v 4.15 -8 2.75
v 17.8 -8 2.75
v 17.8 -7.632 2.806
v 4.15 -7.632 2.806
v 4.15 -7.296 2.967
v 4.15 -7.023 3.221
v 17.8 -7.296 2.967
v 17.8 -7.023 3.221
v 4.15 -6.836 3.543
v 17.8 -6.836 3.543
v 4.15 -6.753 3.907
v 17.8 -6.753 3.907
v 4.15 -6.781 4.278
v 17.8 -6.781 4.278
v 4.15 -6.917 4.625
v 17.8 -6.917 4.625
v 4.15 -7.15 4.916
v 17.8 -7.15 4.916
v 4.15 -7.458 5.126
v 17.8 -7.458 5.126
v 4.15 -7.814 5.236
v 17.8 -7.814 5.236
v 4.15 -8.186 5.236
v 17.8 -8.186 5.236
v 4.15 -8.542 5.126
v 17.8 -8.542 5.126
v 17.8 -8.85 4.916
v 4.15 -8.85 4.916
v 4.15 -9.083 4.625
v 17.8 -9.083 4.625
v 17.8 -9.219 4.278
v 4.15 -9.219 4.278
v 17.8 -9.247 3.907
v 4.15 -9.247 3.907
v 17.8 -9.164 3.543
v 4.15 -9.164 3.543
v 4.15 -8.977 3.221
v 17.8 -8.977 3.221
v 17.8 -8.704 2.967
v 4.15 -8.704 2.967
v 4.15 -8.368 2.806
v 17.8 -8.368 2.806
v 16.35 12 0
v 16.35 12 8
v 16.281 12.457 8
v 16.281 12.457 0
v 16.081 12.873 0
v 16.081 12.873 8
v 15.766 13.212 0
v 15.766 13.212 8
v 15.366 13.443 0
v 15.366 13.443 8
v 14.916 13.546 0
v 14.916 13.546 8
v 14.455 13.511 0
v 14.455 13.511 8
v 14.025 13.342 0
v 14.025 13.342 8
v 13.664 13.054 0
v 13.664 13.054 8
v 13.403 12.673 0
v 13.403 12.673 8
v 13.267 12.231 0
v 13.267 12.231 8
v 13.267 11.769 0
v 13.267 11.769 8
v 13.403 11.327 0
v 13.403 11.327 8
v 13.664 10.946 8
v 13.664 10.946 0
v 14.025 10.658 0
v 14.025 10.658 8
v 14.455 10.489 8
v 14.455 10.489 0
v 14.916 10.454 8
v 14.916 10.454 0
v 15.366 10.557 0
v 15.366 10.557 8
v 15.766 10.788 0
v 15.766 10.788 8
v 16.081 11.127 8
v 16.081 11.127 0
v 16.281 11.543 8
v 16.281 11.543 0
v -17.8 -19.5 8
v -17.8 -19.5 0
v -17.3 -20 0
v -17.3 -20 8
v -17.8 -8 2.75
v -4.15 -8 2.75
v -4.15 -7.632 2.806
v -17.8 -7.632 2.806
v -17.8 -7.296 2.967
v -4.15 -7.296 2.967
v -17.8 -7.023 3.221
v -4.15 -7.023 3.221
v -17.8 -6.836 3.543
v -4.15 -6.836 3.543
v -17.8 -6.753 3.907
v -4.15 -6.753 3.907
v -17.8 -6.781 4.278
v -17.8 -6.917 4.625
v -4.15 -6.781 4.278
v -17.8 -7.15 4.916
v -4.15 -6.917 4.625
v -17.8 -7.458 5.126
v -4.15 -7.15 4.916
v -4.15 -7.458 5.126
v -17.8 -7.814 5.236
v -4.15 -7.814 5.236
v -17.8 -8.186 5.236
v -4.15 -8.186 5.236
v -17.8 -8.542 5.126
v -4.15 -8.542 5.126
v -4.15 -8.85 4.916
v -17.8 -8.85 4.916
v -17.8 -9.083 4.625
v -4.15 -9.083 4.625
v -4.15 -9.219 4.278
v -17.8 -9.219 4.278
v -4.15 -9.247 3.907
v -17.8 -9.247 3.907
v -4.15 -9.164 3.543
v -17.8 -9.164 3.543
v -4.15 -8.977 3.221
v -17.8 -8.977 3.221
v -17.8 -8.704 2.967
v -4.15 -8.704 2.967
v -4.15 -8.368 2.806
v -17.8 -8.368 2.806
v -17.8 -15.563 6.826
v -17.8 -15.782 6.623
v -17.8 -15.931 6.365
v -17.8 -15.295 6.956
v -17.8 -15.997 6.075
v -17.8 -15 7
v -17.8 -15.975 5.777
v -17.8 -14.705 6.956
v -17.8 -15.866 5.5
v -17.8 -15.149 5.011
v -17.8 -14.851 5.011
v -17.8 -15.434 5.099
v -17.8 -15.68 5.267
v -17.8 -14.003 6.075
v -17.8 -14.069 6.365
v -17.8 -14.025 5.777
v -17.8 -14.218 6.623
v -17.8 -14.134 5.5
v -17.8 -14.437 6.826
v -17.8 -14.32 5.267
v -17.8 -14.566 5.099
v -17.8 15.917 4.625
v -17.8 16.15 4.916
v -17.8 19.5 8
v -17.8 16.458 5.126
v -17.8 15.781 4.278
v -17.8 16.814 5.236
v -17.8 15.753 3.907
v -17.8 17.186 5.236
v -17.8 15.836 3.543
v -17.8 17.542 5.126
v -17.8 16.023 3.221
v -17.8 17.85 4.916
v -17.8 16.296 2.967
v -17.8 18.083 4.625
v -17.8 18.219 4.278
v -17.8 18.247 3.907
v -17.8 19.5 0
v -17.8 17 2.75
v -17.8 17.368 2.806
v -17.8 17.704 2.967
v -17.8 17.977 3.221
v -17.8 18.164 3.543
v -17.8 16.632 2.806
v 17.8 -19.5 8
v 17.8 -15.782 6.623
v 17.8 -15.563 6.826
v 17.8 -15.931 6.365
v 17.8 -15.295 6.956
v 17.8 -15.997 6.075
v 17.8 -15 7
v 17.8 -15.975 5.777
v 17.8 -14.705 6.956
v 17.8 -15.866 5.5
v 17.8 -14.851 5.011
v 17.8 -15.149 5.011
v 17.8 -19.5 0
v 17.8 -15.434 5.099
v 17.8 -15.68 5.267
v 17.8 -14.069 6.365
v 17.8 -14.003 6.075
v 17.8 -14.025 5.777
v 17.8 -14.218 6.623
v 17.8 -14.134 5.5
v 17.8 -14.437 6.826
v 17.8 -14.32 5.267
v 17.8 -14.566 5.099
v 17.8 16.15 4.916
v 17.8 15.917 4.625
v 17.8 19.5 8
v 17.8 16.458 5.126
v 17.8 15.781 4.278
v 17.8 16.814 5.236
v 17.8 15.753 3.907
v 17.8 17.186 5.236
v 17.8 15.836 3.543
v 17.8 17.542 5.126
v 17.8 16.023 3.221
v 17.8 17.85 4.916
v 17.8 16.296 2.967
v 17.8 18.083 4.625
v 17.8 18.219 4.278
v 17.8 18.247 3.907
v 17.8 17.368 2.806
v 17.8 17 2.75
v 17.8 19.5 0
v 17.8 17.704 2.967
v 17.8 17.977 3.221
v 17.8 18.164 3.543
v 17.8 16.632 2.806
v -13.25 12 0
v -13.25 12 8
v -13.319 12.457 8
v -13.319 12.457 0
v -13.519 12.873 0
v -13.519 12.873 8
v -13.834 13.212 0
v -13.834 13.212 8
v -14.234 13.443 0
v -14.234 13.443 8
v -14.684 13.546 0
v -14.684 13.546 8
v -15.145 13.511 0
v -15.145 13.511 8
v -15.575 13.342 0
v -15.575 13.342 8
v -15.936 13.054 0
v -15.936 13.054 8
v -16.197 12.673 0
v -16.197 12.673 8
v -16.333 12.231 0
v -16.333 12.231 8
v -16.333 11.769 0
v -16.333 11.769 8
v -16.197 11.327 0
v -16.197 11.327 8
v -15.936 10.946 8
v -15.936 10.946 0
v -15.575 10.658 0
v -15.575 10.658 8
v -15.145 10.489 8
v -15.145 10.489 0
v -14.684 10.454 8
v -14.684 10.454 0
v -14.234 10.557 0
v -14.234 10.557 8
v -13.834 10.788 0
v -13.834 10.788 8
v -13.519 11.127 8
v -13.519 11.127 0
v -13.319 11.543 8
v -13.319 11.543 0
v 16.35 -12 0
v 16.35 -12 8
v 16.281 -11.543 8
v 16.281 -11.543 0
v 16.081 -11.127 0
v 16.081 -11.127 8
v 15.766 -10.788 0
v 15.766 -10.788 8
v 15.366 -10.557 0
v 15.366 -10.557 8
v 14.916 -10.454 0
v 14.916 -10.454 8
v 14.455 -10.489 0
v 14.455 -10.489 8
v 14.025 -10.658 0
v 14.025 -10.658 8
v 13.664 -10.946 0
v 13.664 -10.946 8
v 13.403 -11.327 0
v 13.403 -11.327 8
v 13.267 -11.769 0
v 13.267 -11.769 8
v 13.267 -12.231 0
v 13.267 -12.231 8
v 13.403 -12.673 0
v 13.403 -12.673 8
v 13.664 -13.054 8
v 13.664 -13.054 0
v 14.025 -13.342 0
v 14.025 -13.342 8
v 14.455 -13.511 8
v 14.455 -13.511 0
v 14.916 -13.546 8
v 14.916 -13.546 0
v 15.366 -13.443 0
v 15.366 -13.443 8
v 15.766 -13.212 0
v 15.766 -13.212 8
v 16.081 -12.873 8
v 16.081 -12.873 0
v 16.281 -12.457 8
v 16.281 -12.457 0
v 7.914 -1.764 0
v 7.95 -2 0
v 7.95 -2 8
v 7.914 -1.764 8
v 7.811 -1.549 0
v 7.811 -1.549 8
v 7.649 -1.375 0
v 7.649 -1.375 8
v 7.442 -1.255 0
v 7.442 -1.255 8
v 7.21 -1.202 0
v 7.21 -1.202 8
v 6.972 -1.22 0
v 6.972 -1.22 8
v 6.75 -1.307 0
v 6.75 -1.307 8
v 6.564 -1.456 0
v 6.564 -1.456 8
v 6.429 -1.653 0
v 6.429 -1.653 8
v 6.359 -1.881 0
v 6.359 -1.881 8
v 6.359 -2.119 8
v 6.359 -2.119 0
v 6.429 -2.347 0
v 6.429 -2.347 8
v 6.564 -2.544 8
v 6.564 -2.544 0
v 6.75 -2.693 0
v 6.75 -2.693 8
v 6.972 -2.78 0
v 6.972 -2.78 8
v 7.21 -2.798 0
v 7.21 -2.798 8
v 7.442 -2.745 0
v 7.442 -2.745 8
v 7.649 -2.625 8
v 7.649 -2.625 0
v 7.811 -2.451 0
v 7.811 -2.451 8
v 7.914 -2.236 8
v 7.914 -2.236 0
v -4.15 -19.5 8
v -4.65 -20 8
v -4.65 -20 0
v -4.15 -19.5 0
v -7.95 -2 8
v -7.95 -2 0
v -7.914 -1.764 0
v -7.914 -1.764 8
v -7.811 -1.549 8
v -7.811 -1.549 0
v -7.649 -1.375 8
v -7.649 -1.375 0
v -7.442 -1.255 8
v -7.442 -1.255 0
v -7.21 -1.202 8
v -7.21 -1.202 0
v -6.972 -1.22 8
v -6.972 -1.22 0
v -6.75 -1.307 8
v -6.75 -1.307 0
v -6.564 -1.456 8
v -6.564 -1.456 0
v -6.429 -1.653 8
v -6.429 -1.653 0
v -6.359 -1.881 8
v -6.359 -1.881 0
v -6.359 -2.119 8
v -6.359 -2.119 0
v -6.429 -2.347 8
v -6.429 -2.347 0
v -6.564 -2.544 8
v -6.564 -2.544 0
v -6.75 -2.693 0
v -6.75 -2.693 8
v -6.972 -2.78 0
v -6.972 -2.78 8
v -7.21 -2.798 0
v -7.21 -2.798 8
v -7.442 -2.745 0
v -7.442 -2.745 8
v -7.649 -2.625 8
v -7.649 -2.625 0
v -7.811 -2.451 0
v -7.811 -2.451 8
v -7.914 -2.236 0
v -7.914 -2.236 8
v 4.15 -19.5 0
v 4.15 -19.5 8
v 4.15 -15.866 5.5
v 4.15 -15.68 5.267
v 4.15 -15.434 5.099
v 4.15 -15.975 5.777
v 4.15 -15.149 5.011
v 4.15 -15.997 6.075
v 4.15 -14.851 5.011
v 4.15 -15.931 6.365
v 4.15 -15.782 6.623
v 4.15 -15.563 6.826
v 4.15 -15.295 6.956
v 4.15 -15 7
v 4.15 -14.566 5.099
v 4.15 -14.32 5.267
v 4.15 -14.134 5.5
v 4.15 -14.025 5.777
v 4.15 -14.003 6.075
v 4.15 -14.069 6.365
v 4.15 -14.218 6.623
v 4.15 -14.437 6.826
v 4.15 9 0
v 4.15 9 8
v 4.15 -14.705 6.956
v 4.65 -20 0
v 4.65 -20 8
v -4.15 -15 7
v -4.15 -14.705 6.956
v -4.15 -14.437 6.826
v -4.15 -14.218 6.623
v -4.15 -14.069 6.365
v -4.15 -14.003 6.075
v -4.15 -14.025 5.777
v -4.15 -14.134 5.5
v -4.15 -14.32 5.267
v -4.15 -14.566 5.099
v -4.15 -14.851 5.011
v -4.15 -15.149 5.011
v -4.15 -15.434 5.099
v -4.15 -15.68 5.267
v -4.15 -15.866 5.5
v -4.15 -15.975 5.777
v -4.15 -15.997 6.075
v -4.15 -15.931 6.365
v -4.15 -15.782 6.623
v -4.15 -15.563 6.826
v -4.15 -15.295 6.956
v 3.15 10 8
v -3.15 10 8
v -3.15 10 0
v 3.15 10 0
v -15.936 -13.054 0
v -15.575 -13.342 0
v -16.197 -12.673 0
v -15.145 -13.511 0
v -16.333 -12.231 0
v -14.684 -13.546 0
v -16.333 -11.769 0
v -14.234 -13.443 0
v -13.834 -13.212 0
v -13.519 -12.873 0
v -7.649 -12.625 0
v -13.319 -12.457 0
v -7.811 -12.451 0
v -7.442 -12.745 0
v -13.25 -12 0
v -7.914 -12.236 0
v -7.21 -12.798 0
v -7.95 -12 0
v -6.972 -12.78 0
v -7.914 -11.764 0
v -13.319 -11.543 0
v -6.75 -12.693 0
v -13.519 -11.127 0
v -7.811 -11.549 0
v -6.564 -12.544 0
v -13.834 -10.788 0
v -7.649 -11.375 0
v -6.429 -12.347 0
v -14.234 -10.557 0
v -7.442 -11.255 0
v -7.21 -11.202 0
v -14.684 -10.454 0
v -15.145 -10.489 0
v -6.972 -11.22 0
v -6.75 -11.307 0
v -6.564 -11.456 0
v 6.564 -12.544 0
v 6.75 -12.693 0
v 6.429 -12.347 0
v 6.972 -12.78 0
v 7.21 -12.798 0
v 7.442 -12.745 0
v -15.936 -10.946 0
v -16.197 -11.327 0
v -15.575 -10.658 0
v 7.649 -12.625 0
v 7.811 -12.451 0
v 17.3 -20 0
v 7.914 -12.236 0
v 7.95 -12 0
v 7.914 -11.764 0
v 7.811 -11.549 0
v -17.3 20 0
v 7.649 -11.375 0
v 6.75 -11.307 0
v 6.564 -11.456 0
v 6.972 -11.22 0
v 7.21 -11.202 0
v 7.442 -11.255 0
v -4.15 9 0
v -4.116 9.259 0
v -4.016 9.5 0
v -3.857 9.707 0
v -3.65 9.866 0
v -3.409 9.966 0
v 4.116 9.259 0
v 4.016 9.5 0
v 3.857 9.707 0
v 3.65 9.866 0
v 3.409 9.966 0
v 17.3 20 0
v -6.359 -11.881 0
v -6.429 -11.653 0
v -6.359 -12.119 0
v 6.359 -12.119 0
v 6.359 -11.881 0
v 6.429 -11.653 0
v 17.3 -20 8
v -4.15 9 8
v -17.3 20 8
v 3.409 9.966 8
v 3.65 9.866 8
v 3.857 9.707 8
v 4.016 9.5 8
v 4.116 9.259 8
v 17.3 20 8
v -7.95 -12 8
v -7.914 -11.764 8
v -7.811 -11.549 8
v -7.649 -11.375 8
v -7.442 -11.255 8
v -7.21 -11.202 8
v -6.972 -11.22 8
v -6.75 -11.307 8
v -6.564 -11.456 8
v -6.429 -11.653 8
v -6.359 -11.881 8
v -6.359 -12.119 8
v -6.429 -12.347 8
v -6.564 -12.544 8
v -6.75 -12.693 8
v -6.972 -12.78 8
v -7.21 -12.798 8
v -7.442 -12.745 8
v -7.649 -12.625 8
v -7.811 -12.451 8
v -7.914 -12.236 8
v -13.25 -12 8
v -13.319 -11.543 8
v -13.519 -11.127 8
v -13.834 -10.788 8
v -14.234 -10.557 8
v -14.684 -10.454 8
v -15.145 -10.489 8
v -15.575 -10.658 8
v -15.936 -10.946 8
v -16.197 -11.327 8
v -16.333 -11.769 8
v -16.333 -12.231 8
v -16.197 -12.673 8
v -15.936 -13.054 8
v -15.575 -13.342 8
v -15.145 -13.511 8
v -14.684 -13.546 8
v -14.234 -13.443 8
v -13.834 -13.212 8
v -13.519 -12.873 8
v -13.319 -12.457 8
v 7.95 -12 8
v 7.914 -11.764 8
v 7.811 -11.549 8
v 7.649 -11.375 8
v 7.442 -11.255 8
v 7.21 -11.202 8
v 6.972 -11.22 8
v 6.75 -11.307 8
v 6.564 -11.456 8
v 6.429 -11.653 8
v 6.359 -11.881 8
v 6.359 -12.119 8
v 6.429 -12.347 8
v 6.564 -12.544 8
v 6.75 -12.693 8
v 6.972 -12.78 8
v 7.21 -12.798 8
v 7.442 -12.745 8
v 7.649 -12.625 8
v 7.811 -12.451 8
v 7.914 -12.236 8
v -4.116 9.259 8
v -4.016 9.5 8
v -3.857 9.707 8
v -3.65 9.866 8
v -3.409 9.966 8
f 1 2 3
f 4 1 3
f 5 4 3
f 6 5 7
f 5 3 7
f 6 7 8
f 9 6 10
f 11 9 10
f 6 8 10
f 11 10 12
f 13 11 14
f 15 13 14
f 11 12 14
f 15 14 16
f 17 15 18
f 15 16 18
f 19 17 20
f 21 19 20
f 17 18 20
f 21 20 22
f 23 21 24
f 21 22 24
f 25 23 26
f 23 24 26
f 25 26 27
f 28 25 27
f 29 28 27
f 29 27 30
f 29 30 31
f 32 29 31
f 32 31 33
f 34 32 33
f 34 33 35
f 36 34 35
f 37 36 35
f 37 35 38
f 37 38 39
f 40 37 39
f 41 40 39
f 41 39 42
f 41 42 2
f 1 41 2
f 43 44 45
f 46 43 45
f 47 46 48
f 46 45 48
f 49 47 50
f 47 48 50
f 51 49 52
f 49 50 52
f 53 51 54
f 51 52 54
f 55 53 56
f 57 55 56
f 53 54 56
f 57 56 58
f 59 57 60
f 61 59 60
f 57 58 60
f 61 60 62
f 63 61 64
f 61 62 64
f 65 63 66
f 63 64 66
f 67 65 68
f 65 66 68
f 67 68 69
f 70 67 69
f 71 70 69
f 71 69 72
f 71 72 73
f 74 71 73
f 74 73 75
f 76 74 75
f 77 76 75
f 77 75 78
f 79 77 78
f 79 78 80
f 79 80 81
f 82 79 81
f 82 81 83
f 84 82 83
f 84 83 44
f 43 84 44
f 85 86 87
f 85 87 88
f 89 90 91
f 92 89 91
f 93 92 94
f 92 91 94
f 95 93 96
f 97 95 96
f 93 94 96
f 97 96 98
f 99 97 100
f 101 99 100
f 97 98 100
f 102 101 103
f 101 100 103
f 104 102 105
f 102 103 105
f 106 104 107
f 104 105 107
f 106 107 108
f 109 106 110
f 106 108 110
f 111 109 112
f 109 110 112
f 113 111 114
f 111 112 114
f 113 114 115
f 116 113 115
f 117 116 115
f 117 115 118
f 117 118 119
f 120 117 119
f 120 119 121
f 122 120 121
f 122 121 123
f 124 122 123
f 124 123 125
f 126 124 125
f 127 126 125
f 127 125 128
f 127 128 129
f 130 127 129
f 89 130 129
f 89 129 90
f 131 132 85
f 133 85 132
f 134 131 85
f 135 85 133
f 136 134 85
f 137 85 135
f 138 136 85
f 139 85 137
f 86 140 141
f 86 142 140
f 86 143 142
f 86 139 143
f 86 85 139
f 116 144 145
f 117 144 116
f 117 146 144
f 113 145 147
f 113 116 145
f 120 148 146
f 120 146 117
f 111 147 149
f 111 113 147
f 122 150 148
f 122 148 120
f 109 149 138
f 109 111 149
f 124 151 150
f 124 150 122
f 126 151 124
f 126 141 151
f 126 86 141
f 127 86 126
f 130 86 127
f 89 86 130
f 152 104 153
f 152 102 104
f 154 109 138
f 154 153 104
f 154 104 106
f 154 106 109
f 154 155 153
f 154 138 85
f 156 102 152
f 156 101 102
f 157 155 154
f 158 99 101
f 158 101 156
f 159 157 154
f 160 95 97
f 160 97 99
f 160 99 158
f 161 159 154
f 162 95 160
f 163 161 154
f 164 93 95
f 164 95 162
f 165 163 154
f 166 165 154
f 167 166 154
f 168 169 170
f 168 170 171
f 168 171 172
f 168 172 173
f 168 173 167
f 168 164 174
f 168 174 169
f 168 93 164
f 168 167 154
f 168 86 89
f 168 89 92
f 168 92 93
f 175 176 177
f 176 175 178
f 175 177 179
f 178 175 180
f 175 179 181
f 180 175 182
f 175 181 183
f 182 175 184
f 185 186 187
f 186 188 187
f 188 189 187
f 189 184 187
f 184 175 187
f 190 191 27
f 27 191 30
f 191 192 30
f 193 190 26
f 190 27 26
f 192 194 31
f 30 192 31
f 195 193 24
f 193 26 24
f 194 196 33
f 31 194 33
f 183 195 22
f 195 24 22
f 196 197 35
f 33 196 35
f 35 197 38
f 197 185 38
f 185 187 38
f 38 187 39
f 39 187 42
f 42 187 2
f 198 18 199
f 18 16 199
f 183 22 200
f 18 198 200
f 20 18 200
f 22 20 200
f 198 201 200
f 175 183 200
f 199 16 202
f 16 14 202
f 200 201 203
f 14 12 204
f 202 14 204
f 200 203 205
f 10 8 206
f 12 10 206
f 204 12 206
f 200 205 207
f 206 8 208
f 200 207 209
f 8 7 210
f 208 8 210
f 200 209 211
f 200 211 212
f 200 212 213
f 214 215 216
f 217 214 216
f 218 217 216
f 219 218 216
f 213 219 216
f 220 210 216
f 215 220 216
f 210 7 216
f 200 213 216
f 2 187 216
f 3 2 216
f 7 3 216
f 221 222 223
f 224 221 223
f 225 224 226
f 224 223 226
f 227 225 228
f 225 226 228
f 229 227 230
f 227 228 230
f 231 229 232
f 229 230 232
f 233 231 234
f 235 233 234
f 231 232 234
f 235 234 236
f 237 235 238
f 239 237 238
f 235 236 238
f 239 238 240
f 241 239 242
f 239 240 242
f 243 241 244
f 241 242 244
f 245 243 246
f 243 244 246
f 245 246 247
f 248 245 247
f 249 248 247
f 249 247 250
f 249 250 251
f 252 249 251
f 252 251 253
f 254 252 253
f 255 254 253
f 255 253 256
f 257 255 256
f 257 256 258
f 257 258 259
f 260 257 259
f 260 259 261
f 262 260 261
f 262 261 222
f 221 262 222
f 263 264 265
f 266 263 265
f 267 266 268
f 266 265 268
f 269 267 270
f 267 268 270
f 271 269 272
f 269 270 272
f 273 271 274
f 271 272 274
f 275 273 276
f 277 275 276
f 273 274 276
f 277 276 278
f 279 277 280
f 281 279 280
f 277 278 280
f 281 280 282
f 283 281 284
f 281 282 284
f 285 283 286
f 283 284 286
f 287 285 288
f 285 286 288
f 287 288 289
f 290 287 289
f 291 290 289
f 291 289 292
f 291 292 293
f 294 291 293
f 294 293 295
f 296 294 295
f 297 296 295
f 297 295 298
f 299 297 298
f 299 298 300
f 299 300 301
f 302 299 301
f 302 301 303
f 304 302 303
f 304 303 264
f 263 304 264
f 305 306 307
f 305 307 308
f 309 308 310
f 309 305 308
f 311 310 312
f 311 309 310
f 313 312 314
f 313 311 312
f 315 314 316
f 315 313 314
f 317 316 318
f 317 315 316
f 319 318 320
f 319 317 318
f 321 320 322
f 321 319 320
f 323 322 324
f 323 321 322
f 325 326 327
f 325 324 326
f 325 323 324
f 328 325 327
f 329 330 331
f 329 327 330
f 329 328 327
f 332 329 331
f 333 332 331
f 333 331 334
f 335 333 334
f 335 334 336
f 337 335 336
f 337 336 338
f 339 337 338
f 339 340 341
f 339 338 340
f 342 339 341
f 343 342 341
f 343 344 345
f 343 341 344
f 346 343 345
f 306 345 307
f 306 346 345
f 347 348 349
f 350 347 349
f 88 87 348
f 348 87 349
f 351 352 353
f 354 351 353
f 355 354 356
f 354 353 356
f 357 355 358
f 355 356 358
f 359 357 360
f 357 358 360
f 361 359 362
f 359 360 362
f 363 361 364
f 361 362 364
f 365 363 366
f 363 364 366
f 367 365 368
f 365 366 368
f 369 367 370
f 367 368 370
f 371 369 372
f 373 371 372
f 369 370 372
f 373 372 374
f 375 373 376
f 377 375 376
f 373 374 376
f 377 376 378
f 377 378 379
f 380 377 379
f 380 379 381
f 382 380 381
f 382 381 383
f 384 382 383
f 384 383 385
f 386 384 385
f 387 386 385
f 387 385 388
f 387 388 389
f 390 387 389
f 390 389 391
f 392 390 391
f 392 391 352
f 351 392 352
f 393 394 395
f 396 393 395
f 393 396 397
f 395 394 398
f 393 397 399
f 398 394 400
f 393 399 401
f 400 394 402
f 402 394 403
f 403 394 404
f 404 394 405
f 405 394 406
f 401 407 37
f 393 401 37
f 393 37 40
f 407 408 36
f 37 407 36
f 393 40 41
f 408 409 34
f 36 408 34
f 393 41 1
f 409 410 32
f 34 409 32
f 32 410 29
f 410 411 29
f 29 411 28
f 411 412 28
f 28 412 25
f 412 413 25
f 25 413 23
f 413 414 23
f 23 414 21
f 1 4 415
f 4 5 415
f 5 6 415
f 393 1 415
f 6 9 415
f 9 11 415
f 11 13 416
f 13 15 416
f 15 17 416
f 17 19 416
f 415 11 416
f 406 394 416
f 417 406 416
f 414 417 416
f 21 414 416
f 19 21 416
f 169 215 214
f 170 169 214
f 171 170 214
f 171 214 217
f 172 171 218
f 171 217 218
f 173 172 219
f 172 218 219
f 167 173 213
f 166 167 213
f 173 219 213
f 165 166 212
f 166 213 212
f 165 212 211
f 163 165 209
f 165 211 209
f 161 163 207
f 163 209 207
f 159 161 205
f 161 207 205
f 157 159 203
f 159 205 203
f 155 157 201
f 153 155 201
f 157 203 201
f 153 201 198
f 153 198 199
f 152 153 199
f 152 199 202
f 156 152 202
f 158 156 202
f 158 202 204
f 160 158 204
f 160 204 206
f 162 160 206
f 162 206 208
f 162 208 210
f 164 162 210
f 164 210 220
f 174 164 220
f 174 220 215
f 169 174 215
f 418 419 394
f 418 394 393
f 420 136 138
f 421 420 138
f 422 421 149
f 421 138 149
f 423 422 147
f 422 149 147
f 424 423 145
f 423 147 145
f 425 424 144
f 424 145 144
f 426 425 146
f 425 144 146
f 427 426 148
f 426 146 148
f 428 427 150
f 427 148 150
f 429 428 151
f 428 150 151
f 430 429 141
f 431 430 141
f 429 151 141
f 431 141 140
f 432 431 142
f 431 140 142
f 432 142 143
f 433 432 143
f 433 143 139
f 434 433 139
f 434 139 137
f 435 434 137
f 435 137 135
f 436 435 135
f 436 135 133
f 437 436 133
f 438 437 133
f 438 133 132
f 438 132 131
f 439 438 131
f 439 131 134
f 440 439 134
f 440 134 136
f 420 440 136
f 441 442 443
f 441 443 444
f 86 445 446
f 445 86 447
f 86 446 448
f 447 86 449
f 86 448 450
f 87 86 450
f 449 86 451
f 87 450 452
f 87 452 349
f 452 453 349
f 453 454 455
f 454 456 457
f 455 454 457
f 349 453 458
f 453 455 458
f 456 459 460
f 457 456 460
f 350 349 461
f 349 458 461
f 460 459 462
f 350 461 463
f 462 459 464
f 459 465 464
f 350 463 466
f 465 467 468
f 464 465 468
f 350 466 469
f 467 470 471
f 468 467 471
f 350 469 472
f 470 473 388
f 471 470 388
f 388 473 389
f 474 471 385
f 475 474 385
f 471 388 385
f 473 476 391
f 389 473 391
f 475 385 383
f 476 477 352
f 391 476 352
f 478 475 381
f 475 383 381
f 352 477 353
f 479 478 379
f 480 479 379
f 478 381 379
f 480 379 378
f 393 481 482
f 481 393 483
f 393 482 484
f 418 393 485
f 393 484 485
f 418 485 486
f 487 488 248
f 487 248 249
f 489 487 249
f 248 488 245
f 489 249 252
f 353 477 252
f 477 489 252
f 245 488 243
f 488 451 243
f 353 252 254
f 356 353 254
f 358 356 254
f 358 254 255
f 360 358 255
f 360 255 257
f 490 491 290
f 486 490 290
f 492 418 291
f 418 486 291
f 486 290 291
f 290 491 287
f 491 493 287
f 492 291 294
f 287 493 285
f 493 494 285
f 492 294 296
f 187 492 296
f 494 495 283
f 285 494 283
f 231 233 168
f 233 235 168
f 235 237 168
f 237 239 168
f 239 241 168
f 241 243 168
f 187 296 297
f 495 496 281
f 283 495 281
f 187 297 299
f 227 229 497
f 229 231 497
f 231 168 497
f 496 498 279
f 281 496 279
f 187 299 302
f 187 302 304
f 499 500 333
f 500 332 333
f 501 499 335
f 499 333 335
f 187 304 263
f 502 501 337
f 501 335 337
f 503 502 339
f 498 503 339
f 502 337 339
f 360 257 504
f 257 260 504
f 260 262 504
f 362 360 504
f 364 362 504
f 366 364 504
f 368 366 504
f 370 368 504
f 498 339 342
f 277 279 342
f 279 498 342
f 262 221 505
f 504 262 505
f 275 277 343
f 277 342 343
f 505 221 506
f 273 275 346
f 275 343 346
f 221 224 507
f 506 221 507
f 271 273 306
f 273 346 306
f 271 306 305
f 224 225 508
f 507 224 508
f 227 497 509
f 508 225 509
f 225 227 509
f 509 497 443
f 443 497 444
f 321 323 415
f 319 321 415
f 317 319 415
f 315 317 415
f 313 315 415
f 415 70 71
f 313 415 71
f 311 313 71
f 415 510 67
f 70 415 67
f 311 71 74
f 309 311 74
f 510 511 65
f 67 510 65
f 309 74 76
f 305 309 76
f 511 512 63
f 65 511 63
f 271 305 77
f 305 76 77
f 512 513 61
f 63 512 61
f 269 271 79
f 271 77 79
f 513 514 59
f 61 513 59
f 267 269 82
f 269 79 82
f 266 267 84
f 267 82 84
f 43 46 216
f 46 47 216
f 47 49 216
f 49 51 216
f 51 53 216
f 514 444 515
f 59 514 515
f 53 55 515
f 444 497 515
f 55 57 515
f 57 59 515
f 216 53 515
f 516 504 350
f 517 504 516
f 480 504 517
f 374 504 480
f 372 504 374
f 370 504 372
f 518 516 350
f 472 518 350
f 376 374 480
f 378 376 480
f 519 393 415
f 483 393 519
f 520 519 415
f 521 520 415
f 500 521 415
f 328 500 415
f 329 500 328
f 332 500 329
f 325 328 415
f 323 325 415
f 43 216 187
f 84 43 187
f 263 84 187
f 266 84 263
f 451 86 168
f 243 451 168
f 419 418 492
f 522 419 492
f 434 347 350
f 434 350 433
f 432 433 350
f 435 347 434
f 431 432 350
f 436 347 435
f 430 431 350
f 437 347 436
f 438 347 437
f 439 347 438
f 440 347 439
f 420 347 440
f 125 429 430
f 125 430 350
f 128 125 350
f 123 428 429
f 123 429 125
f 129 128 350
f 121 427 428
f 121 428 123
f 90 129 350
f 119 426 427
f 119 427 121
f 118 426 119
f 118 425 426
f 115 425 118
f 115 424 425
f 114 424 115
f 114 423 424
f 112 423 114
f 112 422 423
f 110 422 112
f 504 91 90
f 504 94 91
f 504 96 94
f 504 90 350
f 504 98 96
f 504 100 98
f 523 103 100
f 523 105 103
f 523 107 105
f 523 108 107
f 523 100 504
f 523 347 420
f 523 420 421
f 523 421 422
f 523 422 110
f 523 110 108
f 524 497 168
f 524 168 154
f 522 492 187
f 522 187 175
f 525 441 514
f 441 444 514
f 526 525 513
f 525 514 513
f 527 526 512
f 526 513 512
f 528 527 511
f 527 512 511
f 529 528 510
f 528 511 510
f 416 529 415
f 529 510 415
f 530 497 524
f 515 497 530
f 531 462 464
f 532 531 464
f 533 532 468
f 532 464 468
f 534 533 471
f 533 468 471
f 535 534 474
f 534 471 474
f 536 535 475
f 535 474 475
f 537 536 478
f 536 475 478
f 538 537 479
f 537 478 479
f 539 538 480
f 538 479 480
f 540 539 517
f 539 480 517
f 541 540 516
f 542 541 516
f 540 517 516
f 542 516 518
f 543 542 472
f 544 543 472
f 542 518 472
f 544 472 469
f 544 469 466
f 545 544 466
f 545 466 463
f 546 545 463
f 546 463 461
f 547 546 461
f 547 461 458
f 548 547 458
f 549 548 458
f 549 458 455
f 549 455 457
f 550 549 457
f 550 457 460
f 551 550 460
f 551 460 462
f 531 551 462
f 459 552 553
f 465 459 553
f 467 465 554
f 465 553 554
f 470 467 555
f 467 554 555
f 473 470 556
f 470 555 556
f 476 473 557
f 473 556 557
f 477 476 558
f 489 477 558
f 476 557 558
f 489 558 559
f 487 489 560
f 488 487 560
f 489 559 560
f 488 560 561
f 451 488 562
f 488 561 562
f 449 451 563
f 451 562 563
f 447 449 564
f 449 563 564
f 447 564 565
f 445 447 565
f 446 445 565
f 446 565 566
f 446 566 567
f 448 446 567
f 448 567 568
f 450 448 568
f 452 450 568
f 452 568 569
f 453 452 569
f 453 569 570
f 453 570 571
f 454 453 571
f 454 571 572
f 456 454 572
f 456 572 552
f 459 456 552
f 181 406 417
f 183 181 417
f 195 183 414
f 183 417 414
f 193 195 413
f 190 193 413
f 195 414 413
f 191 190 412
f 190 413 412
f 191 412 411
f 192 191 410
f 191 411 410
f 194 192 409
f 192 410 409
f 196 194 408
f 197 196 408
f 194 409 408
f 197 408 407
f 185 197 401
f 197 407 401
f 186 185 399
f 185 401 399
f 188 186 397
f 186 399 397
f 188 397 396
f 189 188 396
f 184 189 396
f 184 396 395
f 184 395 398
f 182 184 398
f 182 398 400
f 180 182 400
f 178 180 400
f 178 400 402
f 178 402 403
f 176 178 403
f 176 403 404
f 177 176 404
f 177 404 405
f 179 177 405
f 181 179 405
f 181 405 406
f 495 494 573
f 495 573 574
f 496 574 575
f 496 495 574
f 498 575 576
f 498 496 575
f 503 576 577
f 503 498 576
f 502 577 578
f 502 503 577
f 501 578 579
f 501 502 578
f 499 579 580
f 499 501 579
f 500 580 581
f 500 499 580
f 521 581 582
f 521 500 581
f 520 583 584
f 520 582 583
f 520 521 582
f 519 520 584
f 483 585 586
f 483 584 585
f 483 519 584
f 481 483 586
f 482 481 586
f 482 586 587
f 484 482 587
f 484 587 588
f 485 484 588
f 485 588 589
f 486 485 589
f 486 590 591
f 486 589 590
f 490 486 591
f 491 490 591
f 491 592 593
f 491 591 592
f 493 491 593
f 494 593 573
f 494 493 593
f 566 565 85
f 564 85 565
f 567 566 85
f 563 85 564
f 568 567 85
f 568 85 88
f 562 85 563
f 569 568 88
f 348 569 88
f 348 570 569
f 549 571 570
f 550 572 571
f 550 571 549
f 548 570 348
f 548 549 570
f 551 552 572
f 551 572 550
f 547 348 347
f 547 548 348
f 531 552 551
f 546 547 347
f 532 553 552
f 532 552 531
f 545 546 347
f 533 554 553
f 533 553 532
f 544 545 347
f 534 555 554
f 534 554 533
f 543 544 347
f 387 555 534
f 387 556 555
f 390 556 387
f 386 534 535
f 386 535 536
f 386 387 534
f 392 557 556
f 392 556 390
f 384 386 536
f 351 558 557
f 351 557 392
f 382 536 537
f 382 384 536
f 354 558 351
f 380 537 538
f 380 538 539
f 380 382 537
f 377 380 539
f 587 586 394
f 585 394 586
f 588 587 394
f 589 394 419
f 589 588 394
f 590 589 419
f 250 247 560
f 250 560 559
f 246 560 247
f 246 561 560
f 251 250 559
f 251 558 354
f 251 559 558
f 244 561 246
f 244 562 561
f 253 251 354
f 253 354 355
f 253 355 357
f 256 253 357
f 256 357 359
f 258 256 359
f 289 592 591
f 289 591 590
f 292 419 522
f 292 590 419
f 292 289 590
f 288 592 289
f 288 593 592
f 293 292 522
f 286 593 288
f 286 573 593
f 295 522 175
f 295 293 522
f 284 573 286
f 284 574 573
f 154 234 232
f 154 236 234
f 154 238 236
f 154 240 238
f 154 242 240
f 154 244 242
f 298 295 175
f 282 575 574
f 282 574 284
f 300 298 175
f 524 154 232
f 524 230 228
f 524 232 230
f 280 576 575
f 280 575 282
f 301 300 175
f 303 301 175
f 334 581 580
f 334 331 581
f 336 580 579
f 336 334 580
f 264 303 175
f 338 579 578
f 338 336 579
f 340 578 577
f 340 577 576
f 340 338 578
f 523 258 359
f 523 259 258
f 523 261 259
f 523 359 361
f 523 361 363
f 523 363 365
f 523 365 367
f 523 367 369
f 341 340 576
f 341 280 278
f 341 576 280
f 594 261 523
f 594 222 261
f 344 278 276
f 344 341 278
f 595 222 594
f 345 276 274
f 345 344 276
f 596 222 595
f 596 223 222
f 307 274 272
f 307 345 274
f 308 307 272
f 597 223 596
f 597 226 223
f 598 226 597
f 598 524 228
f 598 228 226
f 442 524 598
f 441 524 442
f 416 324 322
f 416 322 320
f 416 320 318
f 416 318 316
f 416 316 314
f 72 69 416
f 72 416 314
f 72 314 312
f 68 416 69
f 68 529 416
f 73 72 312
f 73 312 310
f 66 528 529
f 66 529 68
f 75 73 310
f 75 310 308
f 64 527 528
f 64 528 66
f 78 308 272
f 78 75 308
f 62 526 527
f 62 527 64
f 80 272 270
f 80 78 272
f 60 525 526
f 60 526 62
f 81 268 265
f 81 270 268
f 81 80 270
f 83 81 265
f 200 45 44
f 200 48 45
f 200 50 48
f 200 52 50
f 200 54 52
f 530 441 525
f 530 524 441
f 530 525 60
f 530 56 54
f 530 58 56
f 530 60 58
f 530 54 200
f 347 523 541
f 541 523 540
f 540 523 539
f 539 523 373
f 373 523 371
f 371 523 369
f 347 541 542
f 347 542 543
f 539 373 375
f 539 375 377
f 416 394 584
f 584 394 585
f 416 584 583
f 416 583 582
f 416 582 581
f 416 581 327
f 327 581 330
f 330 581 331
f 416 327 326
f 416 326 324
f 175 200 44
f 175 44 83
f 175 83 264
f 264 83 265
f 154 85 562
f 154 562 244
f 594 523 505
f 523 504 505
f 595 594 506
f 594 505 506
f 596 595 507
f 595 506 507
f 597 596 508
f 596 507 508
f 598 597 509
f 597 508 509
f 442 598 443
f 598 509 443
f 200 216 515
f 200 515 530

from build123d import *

# Parameters (mm, degrees)
SKETCH_1_W          = 35.6
SKETCH_1_H          = 40
EXTRUDE_1_DEPTH     = 8
SKETCH_5_R          = 1
CUT_EXTRUDE_1_DEPTH = 42
SKETCH_6_W          = 8.3
SKETCH_6_H          = 60
CUT_EXTRUDE_2_DEPTH = 10
SKETCH_2_R          = 1.55
CUT_EXTRUDE_3_DEPTH = 10
HOLE_WIZARD_M2_1_D  = 1.6
HOLE_WIZARD_M3_2_D  = 2.5
FILLET_1_R          = 1
CHAMFER_1_SIZE      = 0.5


with BuildPart() as part:
    # 草图1 → 凸台-拉伸1 (new body)
    with BuildSketch(Plane.XY):
        Rectangle(SKETCH_1_W, SKETCH_1_H)
    extrude(amount=EXTRUDE_1_DEPTH)

    # 草图5 → 切除-拉伸1 (cut)
    with BuildSketch(Plane.ZY.offset(17.8)):
        with Locations((6, -15)):
            Circle(SKETCH_5_R)
    extrude(amount=-CUT_EXTRUDE_1_DEPTH, mode=Mode.SUBTRACT)

    # 草图6 → 切除-拉伸2 (cut)
    with BuildSketch(Plane.XY.offset(8)):
        with Locations((0, -20)):
            Rectangle(SKETCH_6_W, SKETCH_6_H)
    extrude(amount=-CUT_EXTRUDE_2_DEPTH, mode=Mode.SUBTRACT)

    # 草图2 → 切除-拉伸3 (cut)
    with BuildSketch(Plane.XY.offset(8)):
        with Locations((14.8, 12)):
            Circle(SKETCH_2_R)
        with Locations((-14.8, 12)):
            Circle(SKETCH_2_R)
        with Locations((-14.8, -12)):
            Circle(SKETCH_2_R)
        with Locations((14.8, -12)):
            Circle(SKETCH_2_R)
    extrude(amount=-CUT_EXTRUDE_3_DEPTH, mode=Mode.SUBTRACT)

    # M2 螺纹孔1 (through all)
    with Locations(Plane.XY.offset(8)):
        with Locations((-7.15, -12), (-7.15, -2)):
            hole_wizard_m2_1 = Hole(HOLE_WIZARD_M2_1_D / 2)

    # 镜向1: M2 螺纹孔1 across plane
    add(hole_wizard_m2_1.mirror(Plane(origin=(0, 0, 0), x_dir=(0, 0, 1), z_dir=(1, 0, 0))), mode=Mode.SUBTRACT)

    # M3 螺纹孔2 (through all)
    with Locations(Plane.ZY.offset(17.8)):
        with Locations((4, 17), (4, -8)):
            Hole(HOLE_WIZARD_M3_2_D / 2)

    # 圆角1
    fillet_1_edges = [part.edges().sort_by_distance(p)[0] for p in [
        (4.15, 10, 4),
        (-4.15, 10, 4),
    ]]
    fillet(fillet_1_edges, radius=FILLET_1_R)

    # 倒角1
    chamfer_1_edges = [part.edges().sort_by_distance(p)[0] for p in [
        (4.15, -20, 4),
        (-4.15, -20, 4),
        (17.8, -20, 4),
        (-17.8, -20, 4),
        (-17.8, 20, 4),
        (17.8, 20, 4),
    ]]
    chamfer(chamfer_1_edges, length=CHAMFER_1_SIZE)


solid = part.part
